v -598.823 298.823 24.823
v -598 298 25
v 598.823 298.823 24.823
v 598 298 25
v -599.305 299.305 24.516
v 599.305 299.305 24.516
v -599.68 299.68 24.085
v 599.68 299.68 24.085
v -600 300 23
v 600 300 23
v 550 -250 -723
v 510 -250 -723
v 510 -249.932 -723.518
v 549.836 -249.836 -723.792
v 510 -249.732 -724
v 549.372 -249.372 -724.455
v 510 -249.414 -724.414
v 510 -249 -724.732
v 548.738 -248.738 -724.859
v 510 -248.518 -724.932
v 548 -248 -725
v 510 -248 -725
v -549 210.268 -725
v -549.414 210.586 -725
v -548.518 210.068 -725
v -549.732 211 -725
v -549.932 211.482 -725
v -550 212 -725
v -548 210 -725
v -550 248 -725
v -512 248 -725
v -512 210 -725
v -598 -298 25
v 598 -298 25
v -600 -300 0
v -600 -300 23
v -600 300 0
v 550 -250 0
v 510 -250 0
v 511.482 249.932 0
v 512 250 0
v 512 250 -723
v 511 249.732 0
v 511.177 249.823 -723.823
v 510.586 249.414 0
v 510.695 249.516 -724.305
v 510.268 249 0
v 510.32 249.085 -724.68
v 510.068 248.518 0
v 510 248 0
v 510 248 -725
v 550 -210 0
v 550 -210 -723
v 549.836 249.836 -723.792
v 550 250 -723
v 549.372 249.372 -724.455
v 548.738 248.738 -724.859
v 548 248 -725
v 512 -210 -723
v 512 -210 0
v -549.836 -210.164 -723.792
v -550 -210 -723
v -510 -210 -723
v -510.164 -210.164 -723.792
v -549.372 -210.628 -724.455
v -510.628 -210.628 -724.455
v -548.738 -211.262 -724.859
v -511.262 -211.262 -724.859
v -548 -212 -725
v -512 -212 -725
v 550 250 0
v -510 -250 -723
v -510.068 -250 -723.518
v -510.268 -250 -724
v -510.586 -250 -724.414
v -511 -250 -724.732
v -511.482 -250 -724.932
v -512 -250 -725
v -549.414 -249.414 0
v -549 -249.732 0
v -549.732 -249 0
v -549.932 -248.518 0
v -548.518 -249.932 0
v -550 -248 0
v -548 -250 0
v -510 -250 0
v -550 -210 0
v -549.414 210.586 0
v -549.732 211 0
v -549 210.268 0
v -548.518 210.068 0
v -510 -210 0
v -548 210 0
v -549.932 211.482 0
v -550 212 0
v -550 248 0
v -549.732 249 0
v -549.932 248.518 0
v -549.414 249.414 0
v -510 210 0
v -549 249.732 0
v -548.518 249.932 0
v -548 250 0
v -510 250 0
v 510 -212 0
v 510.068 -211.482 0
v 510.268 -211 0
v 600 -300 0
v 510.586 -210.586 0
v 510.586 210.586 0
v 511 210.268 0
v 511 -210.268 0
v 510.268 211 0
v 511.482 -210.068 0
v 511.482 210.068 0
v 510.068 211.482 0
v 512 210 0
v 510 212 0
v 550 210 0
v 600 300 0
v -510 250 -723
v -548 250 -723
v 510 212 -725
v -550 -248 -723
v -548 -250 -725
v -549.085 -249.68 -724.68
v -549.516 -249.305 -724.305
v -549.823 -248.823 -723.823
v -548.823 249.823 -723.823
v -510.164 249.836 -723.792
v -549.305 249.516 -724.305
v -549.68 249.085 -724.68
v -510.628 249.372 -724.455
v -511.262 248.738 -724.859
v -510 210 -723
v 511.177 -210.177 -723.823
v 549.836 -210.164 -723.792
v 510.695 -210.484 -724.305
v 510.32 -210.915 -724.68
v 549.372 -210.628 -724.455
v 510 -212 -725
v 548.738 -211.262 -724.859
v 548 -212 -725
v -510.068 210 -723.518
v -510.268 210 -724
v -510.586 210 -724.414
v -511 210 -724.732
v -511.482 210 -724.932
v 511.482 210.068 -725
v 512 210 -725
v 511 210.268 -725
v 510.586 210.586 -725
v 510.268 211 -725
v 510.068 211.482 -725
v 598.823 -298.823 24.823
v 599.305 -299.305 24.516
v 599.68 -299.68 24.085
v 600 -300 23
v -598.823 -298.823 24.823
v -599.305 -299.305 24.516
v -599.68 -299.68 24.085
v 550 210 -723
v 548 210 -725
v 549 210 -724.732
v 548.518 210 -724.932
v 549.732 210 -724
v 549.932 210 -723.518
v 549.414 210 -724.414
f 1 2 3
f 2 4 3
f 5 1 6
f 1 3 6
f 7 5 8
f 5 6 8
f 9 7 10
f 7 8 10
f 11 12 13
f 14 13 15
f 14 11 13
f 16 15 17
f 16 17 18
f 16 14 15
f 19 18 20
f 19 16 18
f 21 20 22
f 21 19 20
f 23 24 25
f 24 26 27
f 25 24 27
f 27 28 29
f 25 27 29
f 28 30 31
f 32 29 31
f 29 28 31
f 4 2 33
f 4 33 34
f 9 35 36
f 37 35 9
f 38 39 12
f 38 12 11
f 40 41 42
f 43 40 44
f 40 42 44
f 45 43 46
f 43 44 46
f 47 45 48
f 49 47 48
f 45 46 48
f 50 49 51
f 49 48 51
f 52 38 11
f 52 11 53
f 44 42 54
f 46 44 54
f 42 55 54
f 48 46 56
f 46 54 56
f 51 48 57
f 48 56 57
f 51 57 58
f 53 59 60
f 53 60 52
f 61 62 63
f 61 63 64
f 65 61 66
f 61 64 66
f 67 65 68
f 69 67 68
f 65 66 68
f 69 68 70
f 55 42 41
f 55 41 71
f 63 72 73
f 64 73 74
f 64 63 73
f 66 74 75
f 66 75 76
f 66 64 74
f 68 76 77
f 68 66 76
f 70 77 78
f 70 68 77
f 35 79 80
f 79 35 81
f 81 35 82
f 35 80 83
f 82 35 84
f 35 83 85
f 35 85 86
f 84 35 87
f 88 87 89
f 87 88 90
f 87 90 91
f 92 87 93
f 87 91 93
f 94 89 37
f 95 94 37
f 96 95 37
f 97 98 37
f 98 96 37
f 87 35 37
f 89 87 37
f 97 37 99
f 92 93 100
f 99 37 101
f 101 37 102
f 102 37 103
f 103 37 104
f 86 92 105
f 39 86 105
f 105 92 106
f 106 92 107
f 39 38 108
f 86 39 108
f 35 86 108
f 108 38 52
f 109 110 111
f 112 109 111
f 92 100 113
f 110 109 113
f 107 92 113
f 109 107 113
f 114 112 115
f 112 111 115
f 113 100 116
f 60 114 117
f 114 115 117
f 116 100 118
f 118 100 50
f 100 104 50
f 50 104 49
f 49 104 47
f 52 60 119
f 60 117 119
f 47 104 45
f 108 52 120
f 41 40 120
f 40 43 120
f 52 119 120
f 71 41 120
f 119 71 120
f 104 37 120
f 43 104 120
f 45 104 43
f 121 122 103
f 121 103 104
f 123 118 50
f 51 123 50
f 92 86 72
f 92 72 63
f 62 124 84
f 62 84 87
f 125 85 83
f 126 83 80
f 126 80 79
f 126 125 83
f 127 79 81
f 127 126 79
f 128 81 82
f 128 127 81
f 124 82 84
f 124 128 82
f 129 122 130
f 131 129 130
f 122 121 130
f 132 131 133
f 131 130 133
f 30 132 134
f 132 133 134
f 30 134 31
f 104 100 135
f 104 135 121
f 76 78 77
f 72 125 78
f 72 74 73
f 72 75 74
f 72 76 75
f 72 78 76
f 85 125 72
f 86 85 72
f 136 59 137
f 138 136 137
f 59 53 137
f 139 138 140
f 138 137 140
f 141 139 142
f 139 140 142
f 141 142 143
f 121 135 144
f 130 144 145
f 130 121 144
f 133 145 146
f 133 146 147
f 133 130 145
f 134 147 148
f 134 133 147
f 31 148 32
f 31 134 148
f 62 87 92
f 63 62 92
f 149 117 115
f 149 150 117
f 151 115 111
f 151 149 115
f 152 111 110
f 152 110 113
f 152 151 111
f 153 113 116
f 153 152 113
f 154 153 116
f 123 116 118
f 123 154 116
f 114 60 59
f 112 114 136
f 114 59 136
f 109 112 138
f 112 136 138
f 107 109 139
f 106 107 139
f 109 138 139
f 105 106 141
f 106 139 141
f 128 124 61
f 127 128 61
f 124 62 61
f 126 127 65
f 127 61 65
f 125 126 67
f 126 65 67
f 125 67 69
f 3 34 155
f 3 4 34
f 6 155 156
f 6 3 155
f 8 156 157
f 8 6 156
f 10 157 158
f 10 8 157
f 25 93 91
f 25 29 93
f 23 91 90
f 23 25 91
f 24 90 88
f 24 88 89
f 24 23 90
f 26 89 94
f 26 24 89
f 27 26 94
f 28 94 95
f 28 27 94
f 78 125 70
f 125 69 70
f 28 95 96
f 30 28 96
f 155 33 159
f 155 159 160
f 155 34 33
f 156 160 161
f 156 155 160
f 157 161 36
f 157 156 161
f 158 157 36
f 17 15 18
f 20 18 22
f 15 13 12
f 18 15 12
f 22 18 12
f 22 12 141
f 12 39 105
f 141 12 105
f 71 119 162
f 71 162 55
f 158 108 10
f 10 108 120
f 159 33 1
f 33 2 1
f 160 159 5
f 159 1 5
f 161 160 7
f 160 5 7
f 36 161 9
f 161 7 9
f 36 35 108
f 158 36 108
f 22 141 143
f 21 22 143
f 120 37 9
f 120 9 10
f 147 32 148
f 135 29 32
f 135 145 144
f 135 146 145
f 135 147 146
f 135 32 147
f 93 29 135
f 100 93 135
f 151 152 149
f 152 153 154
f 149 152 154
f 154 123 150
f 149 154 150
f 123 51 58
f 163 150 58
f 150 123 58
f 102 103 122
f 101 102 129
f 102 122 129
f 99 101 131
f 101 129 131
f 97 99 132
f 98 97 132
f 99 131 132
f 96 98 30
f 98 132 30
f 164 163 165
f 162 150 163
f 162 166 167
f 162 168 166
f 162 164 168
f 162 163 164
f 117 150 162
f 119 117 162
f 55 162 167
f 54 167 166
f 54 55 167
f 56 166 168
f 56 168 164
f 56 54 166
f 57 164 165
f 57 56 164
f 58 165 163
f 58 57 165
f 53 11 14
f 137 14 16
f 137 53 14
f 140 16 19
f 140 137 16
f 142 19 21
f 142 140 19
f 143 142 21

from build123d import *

# Parameters (mm, degrees)
SKETCH1_W           = 1200
SKETCH1_H           = 600
BOSS_EXTRUDE1_DEPTH = 25
SKETCH2_W           = 40
SKETCH2_H           = 40
BOSS_EXTRUDE2_DEPTH = 750
FILLET1_R           = 2


with BuildPart() as part:
    # Sketch1 → Boss-Extrude1 (new body)
    with BuildSketch(Plane.XY):
        Rectangle(SKETCH1_W, SKETCH1_H)
    extrude(amount=BOSS_EXTRUDE1_DEPTH)

    # Sketch2 → Boss-Extrude2 (add)
    with BuildSketch(Plane.XY.offset(25)):
        with Locations((-530, -230)):
            Rectangle(SKETCH2_W, SKETCH2_H)
        with Locations((530, -230)):
            Rectangle(SKETCH2_W, SKETCH2_H)
        with Locations((-530, 230)):
            Rectangle(SKETCH2_W, SKETCH2_H)
        with Locations((530, 230)):
            Rectangle(SKETCH2_W, SKETCH2_H)
    extrude(amount=-BOSS_EXTRUDE2_DEPTH)

    # Fillet1
    fillet1_edges = [part.edges().sort_by_distance(p)[0] for p in [
        (510, 250, -362.5),
        (550, 230, -725),
        (510, 210, -362.5),
        (530, 250, -725),
        (-550, 250, -362.5),
        (-510, 230, -725),
        (-550, 210, -362.5),
        (-530, 250, -725),
        (510, -210, -362.5),
        (550, -230, -725),
        (530, -250, -725),
        (530, -210, -725),
        (-550, -230, -725),
        (-510, -230, -725),
        (-550, -250, -362.5),
        (-530, -210, -725),
        (-600, 0, 25),
        (600, 0, 25),
        (0, -300, 25),
        (0, 300, 25),
    ]]
    fillet(fillet1_edges, radius=FILLET1_R)


solid = part.part
